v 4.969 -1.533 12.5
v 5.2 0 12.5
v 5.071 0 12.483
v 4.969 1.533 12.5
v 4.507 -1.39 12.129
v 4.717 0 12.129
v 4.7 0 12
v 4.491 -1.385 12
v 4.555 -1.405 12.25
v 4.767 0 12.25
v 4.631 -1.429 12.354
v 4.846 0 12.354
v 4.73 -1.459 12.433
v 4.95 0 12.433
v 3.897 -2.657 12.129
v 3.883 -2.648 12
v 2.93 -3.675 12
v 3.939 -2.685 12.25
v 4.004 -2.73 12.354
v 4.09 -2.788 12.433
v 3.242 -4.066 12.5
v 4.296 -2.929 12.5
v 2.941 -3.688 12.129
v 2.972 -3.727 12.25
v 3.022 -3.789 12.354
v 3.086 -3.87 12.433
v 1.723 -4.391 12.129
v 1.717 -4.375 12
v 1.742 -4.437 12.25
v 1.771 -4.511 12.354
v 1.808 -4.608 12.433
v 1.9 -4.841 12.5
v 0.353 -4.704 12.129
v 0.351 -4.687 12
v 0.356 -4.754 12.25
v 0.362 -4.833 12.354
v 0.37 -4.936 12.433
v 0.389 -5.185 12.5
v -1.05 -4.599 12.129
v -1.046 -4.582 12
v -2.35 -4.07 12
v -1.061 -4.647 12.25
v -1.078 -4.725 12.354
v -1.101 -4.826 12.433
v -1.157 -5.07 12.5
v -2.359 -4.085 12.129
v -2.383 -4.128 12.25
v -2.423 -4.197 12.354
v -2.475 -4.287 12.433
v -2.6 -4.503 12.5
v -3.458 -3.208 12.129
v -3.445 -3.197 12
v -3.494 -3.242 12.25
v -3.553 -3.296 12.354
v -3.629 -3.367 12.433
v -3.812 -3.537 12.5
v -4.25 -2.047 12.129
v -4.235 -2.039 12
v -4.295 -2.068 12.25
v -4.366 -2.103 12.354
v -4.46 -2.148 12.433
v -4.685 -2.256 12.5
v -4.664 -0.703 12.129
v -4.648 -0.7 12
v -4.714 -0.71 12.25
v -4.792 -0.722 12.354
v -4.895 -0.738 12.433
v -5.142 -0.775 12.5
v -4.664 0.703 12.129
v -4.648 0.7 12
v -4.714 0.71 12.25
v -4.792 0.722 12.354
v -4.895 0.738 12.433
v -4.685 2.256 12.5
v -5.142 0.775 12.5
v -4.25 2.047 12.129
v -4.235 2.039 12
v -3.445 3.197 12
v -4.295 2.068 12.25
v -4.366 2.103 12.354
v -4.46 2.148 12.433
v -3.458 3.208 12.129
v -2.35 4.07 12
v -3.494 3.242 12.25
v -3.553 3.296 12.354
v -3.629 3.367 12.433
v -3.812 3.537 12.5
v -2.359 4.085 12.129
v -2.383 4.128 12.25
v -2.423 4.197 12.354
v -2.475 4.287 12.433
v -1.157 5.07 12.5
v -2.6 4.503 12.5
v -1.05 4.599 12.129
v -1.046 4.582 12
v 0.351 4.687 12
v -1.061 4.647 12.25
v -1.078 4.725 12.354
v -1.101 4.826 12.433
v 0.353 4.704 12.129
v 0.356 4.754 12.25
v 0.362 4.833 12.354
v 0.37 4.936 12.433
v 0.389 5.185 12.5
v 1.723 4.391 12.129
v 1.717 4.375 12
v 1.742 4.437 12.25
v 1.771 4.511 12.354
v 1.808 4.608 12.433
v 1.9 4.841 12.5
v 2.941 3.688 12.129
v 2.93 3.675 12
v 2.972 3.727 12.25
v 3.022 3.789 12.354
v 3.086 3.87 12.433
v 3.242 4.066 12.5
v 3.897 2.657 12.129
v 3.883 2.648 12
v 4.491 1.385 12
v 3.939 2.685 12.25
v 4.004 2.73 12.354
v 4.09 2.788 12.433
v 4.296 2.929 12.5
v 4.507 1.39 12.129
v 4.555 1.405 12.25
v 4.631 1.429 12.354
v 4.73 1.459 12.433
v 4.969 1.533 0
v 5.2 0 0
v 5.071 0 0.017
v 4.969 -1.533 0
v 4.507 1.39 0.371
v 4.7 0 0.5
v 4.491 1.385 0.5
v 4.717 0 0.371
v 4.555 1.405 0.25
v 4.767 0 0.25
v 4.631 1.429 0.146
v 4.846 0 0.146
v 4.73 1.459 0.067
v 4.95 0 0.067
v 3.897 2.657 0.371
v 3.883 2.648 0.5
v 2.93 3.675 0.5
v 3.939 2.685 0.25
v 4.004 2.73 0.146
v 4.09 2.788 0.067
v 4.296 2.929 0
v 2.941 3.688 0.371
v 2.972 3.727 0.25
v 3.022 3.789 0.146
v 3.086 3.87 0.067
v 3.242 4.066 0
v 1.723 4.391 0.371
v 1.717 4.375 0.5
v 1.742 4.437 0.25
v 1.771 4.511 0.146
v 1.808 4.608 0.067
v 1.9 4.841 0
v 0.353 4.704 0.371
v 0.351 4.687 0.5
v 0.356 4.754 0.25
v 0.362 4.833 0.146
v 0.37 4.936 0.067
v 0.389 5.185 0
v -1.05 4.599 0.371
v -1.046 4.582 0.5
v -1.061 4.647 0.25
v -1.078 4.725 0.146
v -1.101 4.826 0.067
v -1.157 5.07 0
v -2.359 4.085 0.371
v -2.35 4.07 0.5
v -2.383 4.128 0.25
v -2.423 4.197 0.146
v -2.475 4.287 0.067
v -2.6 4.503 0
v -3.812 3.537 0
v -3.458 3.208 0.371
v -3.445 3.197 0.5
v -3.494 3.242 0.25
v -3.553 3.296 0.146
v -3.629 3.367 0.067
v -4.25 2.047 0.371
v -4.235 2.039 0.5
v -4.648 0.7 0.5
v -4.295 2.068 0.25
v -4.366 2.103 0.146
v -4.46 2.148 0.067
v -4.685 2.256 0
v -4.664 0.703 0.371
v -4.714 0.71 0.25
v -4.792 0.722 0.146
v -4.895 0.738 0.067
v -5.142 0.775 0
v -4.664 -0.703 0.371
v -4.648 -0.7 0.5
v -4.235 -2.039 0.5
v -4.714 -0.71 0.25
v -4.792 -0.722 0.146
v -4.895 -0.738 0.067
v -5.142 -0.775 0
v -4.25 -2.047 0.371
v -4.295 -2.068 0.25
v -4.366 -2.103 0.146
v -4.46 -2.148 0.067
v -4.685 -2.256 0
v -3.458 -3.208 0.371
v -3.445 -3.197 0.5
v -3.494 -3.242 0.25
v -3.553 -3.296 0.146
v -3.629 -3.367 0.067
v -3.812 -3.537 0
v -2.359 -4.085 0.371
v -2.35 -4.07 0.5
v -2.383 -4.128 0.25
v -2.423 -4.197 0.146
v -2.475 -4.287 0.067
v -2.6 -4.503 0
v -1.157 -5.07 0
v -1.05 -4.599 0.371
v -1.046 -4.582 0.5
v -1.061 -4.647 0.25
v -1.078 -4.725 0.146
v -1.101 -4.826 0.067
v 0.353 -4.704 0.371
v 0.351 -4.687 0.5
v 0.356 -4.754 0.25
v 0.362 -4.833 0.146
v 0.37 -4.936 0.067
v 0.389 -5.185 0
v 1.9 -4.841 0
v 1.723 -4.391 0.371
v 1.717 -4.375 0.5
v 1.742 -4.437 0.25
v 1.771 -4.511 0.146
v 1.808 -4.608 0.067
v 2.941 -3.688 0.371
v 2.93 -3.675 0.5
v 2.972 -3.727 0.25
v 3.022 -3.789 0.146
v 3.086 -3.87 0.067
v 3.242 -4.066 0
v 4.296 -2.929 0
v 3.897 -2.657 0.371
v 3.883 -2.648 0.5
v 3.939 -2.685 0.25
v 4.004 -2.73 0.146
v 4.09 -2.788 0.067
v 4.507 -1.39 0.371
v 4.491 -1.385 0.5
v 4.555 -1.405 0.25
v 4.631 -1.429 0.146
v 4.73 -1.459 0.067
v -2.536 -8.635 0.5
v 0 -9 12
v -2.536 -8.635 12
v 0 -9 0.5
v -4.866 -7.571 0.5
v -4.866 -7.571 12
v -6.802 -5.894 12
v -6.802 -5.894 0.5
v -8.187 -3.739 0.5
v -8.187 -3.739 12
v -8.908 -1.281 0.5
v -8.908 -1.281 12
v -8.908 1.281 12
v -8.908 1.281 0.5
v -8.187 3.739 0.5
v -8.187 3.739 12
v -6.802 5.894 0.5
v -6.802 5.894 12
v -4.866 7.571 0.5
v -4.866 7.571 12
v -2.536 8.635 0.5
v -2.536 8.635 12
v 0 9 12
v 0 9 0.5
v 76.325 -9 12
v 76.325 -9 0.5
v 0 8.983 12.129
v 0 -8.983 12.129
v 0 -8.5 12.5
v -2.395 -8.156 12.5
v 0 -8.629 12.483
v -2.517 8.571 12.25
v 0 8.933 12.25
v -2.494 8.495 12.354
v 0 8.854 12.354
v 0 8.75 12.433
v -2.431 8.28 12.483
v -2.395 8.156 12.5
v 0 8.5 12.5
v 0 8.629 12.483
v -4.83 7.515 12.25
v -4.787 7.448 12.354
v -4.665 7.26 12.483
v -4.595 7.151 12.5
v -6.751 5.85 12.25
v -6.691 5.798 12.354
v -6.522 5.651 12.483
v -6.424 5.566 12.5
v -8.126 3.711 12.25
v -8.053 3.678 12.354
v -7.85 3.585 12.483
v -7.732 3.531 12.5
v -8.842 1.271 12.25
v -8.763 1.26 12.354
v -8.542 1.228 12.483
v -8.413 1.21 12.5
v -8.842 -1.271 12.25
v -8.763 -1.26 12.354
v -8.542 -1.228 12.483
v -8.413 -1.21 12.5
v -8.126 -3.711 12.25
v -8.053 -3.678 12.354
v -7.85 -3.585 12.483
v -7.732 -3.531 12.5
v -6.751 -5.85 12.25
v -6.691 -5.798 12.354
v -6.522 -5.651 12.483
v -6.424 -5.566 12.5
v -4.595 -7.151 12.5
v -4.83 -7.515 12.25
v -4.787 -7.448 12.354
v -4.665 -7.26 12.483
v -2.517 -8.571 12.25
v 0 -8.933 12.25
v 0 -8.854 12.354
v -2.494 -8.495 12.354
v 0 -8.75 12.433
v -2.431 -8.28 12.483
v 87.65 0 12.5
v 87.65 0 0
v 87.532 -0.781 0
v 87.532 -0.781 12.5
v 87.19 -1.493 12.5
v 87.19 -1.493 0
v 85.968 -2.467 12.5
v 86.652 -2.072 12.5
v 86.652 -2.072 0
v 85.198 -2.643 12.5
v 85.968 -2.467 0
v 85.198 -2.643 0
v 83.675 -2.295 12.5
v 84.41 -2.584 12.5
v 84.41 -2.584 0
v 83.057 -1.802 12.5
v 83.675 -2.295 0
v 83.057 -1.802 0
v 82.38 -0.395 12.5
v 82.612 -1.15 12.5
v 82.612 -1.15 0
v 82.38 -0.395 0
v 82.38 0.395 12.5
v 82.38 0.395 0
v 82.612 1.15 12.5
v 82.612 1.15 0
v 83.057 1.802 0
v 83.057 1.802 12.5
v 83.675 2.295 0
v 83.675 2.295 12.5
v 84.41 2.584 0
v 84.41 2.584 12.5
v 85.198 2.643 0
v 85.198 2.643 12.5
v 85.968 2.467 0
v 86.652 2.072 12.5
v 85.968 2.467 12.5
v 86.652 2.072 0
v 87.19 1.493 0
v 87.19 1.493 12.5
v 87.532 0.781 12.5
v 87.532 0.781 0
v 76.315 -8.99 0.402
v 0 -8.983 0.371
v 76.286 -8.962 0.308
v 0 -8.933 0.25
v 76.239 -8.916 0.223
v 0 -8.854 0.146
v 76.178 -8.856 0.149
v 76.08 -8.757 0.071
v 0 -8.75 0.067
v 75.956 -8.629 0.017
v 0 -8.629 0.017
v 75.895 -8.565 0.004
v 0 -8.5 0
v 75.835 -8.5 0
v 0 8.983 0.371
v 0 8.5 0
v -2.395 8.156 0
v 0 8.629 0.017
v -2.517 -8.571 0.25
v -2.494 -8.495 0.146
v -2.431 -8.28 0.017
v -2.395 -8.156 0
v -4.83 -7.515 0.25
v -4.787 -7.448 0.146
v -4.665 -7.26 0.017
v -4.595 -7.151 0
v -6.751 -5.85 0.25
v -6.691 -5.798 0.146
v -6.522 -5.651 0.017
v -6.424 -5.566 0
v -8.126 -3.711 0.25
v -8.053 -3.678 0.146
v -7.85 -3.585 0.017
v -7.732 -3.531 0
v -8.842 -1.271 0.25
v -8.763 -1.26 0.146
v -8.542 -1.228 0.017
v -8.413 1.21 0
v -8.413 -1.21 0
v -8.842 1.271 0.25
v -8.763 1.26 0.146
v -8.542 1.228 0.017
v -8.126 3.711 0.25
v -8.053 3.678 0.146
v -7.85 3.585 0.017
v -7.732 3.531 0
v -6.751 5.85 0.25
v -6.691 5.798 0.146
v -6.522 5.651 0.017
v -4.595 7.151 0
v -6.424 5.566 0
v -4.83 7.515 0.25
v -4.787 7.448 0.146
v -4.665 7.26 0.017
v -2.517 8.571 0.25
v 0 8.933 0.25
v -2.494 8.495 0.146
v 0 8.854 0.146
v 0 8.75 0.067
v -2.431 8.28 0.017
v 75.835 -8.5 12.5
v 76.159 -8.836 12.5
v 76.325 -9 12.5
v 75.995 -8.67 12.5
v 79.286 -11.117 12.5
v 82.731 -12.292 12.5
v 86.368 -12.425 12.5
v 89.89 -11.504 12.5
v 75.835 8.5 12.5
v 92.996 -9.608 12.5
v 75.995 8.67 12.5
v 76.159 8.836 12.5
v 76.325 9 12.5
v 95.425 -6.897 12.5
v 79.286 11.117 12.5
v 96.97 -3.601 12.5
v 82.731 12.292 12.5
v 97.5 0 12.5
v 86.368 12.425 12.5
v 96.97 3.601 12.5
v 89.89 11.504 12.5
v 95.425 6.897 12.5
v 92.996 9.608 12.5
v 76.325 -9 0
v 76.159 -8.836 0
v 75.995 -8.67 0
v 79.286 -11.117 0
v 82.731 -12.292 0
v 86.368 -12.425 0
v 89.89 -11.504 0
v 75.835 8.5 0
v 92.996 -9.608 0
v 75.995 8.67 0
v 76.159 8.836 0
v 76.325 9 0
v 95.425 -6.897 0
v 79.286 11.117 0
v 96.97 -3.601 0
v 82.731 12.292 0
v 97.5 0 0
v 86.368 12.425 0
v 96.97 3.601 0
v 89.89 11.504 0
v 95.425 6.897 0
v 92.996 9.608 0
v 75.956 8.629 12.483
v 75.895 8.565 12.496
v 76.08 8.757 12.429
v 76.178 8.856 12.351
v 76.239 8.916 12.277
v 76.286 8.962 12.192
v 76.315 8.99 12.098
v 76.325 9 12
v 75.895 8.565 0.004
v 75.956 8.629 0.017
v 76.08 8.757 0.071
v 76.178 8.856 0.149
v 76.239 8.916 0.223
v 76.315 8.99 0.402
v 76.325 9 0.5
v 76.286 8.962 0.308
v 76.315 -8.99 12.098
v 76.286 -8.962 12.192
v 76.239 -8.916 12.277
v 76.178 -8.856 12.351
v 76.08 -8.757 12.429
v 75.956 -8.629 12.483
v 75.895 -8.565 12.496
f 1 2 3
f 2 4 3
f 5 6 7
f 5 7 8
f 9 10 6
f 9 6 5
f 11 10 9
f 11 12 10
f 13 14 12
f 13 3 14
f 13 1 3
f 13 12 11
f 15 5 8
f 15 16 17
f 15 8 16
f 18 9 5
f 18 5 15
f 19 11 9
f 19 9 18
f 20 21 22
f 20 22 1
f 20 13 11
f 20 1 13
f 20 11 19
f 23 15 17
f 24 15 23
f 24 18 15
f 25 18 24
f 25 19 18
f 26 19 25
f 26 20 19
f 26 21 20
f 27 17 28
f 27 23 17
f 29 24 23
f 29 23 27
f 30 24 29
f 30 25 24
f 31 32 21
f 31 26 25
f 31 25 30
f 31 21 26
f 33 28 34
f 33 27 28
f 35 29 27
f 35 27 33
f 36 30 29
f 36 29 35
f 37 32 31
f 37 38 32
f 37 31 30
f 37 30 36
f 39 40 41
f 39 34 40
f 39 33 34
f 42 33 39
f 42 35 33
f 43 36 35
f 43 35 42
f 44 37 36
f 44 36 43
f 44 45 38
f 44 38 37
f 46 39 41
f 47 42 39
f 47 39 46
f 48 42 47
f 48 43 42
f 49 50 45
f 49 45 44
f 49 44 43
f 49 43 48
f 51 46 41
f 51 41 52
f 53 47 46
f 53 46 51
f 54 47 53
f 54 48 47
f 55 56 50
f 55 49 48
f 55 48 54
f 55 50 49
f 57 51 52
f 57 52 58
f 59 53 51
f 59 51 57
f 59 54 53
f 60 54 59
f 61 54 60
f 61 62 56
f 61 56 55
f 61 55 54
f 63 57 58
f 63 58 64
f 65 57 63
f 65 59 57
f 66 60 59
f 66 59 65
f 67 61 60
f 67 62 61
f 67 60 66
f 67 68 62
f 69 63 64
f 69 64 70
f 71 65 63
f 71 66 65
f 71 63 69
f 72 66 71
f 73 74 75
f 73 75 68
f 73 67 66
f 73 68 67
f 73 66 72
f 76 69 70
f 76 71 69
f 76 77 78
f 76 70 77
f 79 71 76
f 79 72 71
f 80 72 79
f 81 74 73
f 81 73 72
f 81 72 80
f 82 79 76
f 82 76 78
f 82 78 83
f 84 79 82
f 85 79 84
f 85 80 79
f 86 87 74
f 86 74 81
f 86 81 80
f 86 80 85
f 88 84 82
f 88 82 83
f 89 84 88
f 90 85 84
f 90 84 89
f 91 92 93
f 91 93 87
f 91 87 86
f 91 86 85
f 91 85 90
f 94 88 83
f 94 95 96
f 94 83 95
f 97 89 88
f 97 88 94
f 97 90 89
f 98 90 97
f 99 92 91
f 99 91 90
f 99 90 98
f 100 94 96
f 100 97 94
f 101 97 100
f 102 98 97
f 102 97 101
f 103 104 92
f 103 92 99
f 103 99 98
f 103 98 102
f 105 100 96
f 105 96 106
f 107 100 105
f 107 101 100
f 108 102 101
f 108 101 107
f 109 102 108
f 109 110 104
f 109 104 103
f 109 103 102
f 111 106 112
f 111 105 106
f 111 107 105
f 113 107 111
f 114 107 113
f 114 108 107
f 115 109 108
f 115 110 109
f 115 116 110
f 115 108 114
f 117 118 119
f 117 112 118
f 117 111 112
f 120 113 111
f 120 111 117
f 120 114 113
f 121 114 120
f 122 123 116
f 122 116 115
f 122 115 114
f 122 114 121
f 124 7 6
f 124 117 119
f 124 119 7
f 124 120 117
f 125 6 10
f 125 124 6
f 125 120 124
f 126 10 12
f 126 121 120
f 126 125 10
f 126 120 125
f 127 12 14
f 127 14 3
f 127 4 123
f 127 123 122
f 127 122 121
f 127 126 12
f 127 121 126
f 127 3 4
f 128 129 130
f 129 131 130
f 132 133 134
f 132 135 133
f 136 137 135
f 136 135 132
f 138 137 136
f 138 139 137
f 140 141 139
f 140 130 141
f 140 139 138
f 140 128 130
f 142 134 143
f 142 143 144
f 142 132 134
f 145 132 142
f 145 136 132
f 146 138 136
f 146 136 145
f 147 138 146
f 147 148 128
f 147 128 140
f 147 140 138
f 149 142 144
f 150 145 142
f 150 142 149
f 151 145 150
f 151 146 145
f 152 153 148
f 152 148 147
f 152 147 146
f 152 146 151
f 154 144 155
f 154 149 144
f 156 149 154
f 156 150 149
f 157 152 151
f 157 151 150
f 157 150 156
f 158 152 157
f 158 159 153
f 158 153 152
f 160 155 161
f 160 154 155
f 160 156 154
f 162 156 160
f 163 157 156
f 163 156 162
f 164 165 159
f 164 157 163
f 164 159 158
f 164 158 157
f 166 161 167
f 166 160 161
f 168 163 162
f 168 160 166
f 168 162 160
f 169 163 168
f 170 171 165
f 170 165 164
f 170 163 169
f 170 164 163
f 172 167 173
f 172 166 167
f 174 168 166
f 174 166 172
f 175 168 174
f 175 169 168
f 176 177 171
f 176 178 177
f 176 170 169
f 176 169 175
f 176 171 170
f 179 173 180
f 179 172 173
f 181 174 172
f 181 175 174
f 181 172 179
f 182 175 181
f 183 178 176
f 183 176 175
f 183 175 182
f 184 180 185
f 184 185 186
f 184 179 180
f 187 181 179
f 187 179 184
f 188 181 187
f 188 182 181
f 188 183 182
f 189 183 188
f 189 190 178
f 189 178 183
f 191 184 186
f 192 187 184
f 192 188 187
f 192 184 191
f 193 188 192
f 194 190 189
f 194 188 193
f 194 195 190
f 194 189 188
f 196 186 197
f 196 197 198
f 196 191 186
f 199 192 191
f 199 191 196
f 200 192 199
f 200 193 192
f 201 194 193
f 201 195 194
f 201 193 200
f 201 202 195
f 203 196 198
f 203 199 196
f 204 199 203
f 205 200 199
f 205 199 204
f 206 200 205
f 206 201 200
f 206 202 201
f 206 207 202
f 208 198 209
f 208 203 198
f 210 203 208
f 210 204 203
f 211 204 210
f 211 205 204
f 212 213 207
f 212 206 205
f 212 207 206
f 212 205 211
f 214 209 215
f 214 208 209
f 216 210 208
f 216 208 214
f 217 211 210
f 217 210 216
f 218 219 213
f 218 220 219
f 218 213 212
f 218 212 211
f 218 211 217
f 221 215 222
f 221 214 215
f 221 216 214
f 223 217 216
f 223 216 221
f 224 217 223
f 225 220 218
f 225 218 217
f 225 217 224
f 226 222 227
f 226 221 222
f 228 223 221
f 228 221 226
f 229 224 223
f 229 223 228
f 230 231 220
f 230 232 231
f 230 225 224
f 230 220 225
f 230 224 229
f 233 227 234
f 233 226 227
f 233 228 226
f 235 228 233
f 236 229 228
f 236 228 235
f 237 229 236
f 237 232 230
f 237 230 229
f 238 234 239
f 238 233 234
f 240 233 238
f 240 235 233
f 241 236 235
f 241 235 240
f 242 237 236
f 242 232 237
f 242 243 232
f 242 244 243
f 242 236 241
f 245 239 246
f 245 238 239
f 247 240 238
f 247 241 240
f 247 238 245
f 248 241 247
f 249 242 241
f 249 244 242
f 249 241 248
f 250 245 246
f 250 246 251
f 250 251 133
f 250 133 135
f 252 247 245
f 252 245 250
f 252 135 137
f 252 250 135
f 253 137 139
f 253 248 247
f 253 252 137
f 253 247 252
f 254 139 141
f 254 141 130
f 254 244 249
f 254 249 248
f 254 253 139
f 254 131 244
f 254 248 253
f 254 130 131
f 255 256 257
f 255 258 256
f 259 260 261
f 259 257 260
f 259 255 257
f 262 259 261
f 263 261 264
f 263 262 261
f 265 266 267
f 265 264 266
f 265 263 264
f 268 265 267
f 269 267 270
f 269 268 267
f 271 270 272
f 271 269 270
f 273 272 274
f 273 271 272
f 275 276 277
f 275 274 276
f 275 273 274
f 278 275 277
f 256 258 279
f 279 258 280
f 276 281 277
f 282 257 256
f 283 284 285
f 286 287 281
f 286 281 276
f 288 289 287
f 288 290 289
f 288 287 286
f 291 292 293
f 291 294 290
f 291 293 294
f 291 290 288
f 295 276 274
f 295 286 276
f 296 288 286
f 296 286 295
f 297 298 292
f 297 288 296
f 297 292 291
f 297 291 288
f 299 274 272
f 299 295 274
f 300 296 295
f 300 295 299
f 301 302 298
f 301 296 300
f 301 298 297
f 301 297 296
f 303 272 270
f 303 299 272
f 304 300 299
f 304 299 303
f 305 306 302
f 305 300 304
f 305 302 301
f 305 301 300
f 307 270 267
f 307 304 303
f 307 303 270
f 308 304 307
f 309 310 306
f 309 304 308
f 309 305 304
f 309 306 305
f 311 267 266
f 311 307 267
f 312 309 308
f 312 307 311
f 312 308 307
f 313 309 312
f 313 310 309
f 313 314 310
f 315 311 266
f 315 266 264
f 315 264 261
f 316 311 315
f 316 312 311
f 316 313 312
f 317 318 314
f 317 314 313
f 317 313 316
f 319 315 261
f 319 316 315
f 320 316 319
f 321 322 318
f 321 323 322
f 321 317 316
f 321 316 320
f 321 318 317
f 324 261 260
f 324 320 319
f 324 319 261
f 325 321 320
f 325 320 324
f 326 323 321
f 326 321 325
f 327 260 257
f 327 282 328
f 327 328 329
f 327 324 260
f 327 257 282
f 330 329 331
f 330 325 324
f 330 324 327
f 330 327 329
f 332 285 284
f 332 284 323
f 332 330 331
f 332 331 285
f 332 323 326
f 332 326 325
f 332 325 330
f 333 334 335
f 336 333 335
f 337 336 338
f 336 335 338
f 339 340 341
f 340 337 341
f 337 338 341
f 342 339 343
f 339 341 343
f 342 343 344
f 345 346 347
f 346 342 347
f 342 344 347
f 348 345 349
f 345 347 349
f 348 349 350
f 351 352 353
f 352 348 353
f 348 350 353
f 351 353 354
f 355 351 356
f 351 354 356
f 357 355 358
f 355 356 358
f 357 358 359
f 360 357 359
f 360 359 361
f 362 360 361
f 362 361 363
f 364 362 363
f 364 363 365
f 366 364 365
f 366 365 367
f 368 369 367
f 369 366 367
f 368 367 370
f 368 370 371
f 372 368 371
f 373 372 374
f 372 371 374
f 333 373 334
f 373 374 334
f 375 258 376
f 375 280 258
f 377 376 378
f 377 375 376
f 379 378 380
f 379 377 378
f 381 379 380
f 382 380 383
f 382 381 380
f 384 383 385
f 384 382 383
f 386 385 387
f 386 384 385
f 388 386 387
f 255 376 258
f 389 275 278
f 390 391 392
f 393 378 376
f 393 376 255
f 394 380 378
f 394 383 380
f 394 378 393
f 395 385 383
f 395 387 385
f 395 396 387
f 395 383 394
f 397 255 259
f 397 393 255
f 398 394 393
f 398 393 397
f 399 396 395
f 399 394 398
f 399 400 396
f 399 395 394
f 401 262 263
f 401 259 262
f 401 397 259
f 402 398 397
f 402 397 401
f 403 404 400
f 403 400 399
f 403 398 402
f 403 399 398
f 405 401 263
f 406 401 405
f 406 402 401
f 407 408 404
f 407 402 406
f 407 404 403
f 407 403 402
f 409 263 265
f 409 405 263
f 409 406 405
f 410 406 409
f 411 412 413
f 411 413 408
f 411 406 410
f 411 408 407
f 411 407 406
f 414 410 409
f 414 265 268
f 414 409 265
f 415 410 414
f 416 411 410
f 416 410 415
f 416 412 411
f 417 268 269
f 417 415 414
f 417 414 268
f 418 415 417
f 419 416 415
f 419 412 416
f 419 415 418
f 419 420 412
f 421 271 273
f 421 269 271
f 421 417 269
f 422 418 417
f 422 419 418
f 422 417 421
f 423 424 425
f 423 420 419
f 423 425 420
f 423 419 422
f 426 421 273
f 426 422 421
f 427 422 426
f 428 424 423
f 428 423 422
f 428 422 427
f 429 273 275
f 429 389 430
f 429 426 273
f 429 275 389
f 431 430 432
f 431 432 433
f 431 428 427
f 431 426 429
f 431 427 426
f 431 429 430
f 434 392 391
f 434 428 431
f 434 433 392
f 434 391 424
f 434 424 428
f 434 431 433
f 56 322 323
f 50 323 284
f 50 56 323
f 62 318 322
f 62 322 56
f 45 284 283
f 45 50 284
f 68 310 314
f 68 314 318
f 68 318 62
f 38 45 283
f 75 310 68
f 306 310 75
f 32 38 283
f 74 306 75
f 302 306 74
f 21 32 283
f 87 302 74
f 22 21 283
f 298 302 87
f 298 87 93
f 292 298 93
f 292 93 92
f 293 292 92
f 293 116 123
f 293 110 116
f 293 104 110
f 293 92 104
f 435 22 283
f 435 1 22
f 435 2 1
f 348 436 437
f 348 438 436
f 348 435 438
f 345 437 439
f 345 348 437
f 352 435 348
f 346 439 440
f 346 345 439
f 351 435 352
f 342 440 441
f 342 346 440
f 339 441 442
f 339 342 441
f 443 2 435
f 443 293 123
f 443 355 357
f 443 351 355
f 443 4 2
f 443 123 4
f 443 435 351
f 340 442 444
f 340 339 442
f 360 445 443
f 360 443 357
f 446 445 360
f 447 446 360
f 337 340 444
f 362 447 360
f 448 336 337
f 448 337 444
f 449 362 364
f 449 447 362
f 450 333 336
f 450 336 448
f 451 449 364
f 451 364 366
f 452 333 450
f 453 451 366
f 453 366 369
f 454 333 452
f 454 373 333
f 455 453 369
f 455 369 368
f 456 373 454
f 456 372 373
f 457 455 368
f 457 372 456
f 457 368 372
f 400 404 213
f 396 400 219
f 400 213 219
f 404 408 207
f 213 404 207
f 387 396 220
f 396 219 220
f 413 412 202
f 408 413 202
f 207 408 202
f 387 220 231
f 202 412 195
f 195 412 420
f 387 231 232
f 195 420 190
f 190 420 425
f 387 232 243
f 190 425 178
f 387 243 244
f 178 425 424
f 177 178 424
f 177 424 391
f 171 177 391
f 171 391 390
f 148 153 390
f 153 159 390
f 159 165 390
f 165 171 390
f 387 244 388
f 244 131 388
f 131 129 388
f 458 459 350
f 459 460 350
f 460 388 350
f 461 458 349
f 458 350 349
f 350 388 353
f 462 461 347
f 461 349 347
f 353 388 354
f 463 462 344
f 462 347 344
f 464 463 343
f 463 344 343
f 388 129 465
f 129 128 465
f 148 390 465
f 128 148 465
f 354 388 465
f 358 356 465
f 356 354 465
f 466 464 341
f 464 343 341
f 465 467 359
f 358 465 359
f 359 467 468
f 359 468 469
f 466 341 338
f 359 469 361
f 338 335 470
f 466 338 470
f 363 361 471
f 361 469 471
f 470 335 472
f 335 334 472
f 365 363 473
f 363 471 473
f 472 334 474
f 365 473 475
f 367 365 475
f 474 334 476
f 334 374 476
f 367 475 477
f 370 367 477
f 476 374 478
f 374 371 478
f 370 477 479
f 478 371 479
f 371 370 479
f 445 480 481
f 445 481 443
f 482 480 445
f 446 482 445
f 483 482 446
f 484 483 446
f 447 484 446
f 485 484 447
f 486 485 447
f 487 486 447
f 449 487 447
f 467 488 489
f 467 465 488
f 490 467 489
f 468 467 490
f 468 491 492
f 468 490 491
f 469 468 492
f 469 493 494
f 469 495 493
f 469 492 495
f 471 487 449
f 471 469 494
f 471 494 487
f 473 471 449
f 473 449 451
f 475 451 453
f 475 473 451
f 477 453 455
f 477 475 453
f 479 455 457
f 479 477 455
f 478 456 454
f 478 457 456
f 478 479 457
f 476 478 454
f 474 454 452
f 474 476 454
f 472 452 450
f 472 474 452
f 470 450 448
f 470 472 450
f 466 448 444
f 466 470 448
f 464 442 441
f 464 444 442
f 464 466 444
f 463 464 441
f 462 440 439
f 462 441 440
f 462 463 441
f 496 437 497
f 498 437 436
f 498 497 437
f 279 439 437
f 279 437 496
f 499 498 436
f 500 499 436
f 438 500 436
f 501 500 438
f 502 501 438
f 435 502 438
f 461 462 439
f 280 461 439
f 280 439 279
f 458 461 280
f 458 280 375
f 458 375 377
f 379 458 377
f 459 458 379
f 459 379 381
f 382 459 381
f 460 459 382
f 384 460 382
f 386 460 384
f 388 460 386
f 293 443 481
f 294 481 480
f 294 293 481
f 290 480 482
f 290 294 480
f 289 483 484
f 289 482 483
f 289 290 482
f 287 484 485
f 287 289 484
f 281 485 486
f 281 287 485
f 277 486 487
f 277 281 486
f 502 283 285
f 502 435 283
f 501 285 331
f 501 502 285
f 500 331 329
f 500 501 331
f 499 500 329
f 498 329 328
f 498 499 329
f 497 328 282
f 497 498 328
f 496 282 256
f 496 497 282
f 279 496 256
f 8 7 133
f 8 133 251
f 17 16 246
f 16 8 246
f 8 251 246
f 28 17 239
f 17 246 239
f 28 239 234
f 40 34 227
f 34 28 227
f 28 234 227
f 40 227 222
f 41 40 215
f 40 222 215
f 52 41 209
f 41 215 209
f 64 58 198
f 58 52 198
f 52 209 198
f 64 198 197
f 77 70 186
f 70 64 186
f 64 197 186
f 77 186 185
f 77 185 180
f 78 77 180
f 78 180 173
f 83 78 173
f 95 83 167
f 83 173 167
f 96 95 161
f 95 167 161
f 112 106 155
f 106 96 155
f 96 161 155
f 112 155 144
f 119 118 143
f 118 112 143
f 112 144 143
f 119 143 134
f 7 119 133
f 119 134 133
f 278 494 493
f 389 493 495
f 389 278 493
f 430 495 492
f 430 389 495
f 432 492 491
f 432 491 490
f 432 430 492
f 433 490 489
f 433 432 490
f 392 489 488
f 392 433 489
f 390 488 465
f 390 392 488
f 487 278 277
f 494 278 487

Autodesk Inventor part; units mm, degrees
ref_plane "YZ Plane" through (0, 0, 0) normal (1, 0, 0) x (0, 1, 0)
ref_plane "XZ Plane" through (0, 0, 0) normal (0, 1, 0) x (-1, 0, 0)
ref_plane "XY Plane" through (0, 0, 0) normal (0, 0, 1) x (1, 0, 0)
sketch "Sketch1" plane through (0, 0, 0) normal (0, 0, 1) x (1, 0, 0)
  circle A0 centre (0, 0) radius 4.7
  arc A1 (0, 9) -> (0, -9) centre (0, 0) ccw
  circle A2 centre (85, 0) radius 2.65
  arc A3 (76.3253, -9) -> (76.3253, 9) centre (85, 0) ccw
  line L0 (0, 9) -> (76.3253, 9)
  line L1 (0, -9) -> (76.3253, -9)
  dimension "d0" = 9.4
  dimension "d1" = 18
  dimension "d3" = 5.3
  dimension "d4" = 25
extrude "Extrusion1" add sketch "Sketch1" along normal blind 12.5
fillet "Fillet1" radius 0.5 8 edges at (-4.7, 0, 0) (-9, 0, 0) (38.1627, 9, 0) (38.1627, -9, 0) (-9, 0, 12.5) (38.1627, 9, 12.5) (38.1627, -9, 12.5) (-4.7, 0, 12.5)
properties part number "Arm Link Lower_3DPrint"
